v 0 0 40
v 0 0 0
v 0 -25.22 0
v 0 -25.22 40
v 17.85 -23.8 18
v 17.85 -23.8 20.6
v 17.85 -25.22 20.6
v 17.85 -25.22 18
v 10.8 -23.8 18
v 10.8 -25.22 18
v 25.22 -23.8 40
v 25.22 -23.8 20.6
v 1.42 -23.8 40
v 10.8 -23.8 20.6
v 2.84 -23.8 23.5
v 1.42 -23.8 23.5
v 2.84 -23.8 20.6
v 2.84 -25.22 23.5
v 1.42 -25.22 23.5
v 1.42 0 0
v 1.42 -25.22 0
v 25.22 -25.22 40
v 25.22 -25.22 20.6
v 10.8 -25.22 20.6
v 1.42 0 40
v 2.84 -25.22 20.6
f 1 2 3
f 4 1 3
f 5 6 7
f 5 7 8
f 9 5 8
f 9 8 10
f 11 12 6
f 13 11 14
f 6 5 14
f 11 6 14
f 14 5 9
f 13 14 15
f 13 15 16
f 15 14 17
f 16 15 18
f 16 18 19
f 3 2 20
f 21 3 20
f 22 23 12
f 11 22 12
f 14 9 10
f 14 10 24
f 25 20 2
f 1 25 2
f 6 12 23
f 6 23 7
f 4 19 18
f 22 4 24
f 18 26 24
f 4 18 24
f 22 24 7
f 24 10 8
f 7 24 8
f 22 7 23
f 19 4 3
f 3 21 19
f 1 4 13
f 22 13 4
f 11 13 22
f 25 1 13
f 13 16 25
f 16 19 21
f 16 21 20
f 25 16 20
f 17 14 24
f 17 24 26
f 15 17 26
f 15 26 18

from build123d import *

# Parameters (mm, degrees)
EXTRUDE1_DEPTH     = 40
CUT_EXTRUDE3_DEPTH = 2.42


with BuildPart() as part:
    # Sketch1 → Extrude1 (new body)
    with BuildSketch(Plane.XY):
        Polygon((0, 0), (0, -25.22), (25.22, -25.22), (25.22, -23.8), (1.42, -23.8), (1.42, 0), align=None)
    extrude(amount=EXTRUDE1_DEPTH)

    # Sketch3 → Cut-Extrude3 (cut, through all)
    with BuildSketch(Plane(origin=(0, -23.8, 0), x_dir=(-1, 0, 0), z_dir=(0, 1, 0))):
        Polygon((-25.22, 0), (-25.22, 20.6), (-17.85, 20.6), (-17.85, 18), (-10.8, 18), (-10.8, 20.6), (-2.84, 20.6), (-2.84, 23.5), (-1.42, 23.5), (-1.42, 0), align=None)
    extrude(amount=-CUT_EXTRUDE3_DEPTH, mode=Mode.SUBTRACT)


solid = part.part
